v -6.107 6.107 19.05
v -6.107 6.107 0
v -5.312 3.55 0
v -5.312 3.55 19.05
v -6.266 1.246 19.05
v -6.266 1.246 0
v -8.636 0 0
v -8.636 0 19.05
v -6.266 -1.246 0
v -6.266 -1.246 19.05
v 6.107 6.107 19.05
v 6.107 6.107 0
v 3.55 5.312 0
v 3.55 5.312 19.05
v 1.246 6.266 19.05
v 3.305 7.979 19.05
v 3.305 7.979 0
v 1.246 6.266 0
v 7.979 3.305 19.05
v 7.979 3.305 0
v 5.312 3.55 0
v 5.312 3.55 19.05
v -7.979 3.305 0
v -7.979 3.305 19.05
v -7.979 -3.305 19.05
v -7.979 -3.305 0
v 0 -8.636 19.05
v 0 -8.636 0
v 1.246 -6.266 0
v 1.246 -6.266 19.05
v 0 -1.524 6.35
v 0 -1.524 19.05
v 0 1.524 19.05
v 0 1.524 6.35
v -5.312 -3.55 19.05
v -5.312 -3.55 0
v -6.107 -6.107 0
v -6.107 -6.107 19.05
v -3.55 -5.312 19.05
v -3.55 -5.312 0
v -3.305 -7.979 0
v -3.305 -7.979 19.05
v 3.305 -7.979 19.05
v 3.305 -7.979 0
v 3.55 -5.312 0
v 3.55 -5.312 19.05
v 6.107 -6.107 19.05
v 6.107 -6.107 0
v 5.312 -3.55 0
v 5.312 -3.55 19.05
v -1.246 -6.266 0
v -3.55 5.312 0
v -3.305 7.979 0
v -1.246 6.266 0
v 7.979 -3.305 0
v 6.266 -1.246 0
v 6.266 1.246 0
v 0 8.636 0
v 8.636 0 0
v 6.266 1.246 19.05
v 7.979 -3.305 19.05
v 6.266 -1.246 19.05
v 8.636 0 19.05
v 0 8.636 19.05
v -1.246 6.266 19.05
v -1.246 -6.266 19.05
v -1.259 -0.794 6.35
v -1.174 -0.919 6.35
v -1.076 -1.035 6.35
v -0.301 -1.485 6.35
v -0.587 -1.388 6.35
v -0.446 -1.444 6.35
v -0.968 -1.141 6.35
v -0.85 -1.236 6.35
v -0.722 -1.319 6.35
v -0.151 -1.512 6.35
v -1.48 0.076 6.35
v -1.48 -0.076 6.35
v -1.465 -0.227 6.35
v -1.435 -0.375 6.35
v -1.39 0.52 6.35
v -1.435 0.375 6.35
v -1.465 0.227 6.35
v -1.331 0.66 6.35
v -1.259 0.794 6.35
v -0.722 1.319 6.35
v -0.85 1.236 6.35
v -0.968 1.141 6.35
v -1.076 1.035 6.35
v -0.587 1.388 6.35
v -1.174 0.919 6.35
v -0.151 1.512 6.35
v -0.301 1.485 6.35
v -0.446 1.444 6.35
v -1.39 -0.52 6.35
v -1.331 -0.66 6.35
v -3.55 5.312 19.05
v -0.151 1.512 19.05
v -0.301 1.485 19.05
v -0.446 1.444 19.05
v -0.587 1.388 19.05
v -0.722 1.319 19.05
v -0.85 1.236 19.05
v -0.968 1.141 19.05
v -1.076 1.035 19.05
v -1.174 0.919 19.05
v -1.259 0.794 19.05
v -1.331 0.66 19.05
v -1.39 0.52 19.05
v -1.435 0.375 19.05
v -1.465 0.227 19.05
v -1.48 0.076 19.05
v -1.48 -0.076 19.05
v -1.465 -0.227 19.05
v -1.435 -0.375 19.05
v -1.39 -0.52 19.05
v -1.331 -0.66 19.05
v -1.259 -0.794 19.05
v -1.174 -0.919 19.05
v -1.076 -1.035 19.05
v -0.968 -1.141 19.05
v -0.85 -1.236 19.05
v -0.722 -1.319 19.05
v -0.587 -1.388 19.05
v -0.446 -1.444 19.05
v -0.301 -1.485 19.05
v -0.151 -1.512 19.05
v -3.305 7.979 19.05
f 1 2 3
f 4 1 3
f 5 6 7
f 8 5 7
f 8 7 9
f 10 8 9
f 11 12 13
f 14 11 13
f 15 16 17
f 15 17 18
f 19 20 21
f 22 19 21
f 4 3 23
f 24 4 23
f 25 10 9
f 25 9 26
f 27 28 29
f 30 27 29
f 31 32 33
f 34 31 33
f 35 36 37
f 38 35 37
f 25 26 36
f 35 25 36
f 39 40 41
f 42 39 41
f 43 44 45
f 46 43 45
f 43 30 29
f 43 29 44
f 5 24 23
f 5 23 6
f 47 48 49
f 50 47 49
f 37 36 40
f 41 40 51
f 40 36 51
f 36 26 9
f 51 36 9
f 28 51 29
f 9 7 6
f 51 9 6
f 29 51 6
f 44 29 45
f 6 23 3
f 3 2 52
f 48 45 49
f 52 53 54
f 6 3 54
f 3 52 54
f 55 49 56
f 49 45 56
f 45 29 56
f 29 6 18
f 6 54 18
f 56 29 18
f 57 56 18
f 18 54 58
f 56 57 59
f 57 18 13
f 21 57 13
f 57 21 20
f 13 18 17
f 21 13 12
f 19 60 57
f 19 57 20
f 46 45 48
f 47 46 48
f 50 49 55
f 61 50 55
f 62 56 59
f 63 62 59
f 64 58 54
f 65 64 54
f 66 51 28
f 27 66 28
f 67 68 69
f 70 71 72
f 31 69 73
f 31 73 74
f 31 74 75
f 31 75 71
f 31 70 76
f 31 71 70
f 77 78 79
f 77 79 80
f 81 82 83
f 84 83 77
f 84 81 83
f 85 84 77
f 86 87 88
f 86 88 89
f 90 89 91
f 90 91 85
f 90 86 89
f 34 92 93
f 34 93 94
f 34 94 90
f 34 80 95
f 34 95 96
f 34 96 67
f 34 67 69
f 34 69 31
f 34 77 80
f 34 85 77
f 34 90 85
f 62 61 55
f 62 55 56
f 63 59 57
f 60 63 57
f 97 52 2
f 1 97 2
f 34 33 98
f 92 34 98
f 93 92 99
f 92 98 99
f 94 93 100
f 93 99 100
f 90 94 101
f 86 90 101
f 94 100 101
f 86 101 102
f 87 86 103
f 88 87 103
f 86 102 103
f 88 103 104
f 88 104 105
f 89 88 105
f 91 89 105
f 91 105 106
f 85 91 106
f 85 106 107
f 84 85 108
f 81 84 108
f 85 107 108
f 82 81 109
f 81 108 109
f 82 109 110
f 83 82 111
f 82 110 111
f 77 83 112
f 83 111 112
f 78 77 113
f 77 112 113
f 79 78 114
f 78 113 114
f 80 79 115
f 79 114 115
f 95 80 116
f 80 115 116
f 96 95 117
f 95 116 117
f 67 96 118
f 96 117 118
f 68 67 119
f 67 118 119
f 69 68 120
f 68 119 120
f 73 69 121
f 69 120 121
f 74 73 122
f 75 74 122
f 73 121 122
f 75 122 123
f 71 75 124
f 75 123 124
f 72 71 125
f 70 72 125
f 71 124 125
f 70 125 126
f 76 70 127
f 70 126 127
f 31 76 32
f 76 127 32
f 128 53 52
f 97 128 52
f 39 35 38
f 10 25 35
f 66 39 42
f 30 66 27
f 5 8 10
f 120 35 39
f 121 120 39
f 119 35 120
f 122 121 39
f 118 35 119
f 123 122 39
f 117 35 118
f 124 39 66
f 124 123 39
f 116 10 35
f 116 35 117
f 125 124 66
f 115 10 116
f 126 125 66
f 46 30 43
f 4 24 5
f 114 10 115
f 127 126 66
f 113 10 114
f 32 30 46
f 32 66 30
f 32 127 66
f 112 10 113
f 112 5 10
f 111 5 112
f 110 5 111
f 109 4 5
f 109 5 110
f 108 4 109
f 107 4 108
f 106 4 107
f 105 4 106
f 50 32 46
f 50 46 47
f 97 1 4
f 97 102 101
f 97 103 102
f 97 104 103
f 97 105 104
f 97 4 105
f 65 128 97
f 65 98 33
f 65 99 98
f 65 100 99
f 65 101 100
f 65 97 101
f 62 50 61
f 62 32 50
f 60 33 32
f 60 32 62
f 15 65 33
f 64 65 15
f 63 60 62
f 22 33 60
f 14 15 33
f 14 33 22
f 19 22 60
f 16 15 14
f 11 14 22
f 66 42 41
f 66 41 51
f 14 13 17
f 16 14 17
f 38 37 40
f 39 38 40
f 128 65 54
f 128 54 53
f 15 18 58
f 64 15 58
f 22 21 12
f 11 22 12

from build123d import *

# Parameters (mm, degrees)
F1_DEPTH = 19.05
F3_DEPTH = 12.7


with BuildPart() as f1:
    # F0 (on Top) → F1 (new body)
    with BuildSketch(Plane.XY):
        with BuildLine():
            ThreePointArc((3.5542700278, 5.2620969746), (4.4901280605, 4.4901280605), (5.2620969746, 3.5542700278))
            Line((5.2620969746, 3.5542700278), (5.31242539, 3.5496491612))
            Line((5.31242539, 3.5496491612), (6.1065741623, 6.1065741623))
            Line((6.1065741623, 6.1065741623), (3.5496491612, 5.31242539))
            Line((3.5496491612, 5.31242539), (3.5542700278, 5.2620969746))
        make_face()
        with BuildLine():
            Line((6.2664330105, -1.2464710252), (6.2217039467, -1.27))
            ThreePointArc((6.2217039467, -1.27), (5.8666350314, -2.4300397955), (5.2974346633, -3.5013834391))
            Line((5.2974346633, -3.5013834391), (5.31242539, -3.5496491612))
            Line((5.31242539, -3.5496491612), (7.9786236428, -3.3048541219))
            Line((7.9786236428, -3.3048541219), (6.2664330105, -1.2464710252))
        make_face()
        with BuildLine():
            Line((1.2464710252, -6.2664330105), (1.2076160152, -6.2341128928))
            ThreePointArc((1.2076160152, -6.2341128928), (0, -6.35), (-1.2076160152, -6.2341128928))
            Line((-1.2076160152, -6.2341128928), (-1.2464710252, -6.2664330105))
            Line((-1.2464710252, -6.2664330105), (0, -8.636))
            Line((0, -8.636), (1.2464710252, -6.2664330105))
        make_face()
        with BuildLine():
            Line((-1.2464710252, -6.2664330105), (-1.27, -6.2217039467))
            ThreePointArc((-1.27, -6.2217039467), (-2.4300397955, -5.8666350314), (-3.5013834391, -5.2974346633))
            Line((-3.5013834391, -5.2974346633), (-3.5496491612, -5.31242539))
            Line((-3.5496491612, -5.31242539), (-3.3048541219, -7.9786236428))
            Line((-3.3048541219, -7.9786236428), (-1.2464710252, -6.2664330105))
        make_face()
        with BuildLine():
            ThreePointArc((6.2341128928, -1.2076160152), (6.3209618283, -0.6065818703), (6.35, 0))
            ThreePointArc((6.35, 0), (6.3209618283, 0.6065818703), (6.2341128928, 1.2076160152))
            ThreePointArc((6.2341128928, 1.2076160152), (6.2279865306, 1.2388235448), (6.2217039467, 1.27))
            ThreePointArc((6.2217039467, 1.27), (5.8666350314, 2.4300397955), (5.2974346633, 3.5013834391))
            ThreePointArc((5.2974346633, 3.5013834391), (5.2798320381, 3.5278709797), (5.2620969746, 3.5542700278))
            ThreePointArc((5.2620969746, 3.5542700278), (4.4901280605, 4.4901280605), (3.5542700278, 5.2620969746))
            ThreePointArc((3.5542700278, 5.2620969746), (3.5278709797, 5.2798320381), (3.5013834391, 5.2974346633))
            ThreePointArc((3.5013834391, 5.2974346633), (2.4300397955, 5.8666350314), (1.27, 6.2217039467))
            ThreePointArc((1.27, 6.2217039467), (1.2388235448, 6.2279865306), (1.2076160152, 6.2341128928))
            ThreePointArc((1.2076160152, 6.2341128928), (0, 6.35), (-1.2076160152, 6.2341128928))
            ThreePointArc((-1.2076160152, 6.2341128928), (-1.2388235448, 6.2279865306), (-1.27, 6.2217039467))
            ThreePointArc((-1.27, 6.2217039467), (-2.4300397955, 5.8666350314), (-3.5013834391, 5.2974346633))
            ThreePointArc((-3.5013834391, 5.2974346633), (-3.5278709797, 5.2798320381), (-3.5542700278, 5.2620969746))
            ThreePointArc((-3.5542700278, 5.2620969746), (-4.4901280605, 4.4901280605), (-5.2620969746, 3.5542700278))
            ThreePointArc((-5.2620969746, 3.5542700278), (-5.2798320381, 3.5278709797), (-5.2974346633, 3.5013834391))
            ThreePointArc((-5.2974346633, 3.5013834391), (-5.8666350314, 2.4300397955), (-6.2217039467, 1.27))
            ThreePointArc((-6.2217039467, 1.27), (-6.2279865306, 1.2388235448), (-6.2341128928, 1.2076160152))
            ThreePointArc((-6.2341128928, 1.2076160152), (-6.35, 0), (-6.2341128928, -1.2076160152))
            ThreePointArc((-6.2341128928, -1.2076160152), (-6.2279865306, -1.2388235448), (-6.2217039467, -1.27))
            ThreePointArc((-6.2217039467, -1.27), (-5.8666350314, -2.4300397955), (-5.2974346633, -3.5013834391))
            ThreePointArc((-5.2974346633, -3.5013834391), (-5.2798320381, -3.5278709797), (-5.2620969746, -3.5542700278))
            ThreePointArc((-5.2620969746, -3.5542700278), (-4.4901280605, -4.4901280605), (-3.5542700278, -5.2620969746))
            ThreePointArc((-3.5542700278, -5.2620969746), (-3.5278709797, -5.2798320381), (-3.5013834391, -5.2974346633))
            ThreePointArc((-3.5013834391, -5.2974346633), (-2.4300397955, -5.8666350314), (-1.27, -6.2217039467))
            ThreePointArc((-1.27, -6.2217039467), (-1.2388235448, -6.2279865306), (-1.2076160152, -6.2341128928))
            ThreePointArc((-1.2076160152, -6.2341128928), (0, -6.35), (1.2076160152, -6.2341128928))
            ThreePointArc((1.2076160152, -6.2341128928), (1.2388235448, -6.2279865306), (1.27, -6.2217039467))
            ThreePointArc((1.27, -6.2217039467), (2.4300397955, -5.8666350314), (3.5013834391, -5.2974346633))
            ThreePointArc((3.5013834391, -5.2974346633), (3.5278709797, -5.2798320381), (3.5542700278, -5.2620969746))
            ThreePointArc((3.5542700278, -5.2620969746), (4.4901280605, -4.4901280605), (5.2620969746, -3.5542700278))
            ThreePointArc((5.2620969746, -3.5542700278), (5.2798320381, -3.5278709797), (5.2974346633, -3.5013834391))
            ThreePointArc((5.2974346633, -3.5013834391), (5.8666350314, -2.4300397955), (6.2217039467, -1.27))
            ThreePointArc((6.2217039467, -1.27), (6.2279865306, -1.2388235448), (6.2341128928, -1.2076160152))
        make_face()
        with BuildLine():
            ThreePointArc((1.27, 6.2217039467), (2.4300397955, 5.8666350314), (3.5013834391, 5.2974346633))
            Line((3.5013834391, 5.2974346633), (3.5496491612, 5.31242539))
            Line((3.5496491612, 5.31242539), (3.3048541219, 7.9786236428))
            Line((3.3048541219, 7.9786236428), (1.2464710252, 6.2664330105))
            Line((1.2464710252, 6.2664330105), (1.27, 6.2217039467))
        make_face()
        with BuildLine():
            ThreePointArc((5.2974346633, 3.5013834391), (5.8666350314, 2.4300397955), (6.2217039467, 1.27))
            Line((6.2217039467, 1.27), (6.2664330105, 1.2464710252))
            Line((6.2664330105, 1.2464710252), (7.9786236428, 3.3048541219))
            Line((7.9786236428, 3.3048541219), (5.31242539, 3.5496491612))
            Line((5.31242539, 3.5496491612), (5.2974346633, 3.5013834391))
        make_face()
        with BuildLine():
            ThreePointArc((-6.2217039467, 1.27), (-5.8666350314, 2.4300397955), (-5.2974346633, 3.5013834391))
            Line((-5.2974346633, 3.5013834391), (-5.31242539, 3.5496491612))
            Line((-5.31242539, 3.5496491612), (-7.9786236428, 3.3048541219))
            Line((-7.9786236428, 3.3048541219), (-6.2664330105, 1.2464710252))
            Line((-6.2664330105, 1.2464710252), (-6.2217039467, 1.27))
        make_face()
        with BuildLine():
            Line((5.31242539, -3.5496491612), (5.2620969746, -3.5542700278))
            ThreePointArc((5.2620969746, -3.5542700278), (4.4901280605, -4.4901280605), (3.5542700278, -5.2620969746))
            Line((3.5542700278, -5.2620969746), (3.5496491612, -5.31242539))
            Line((3.5496491612, -5.31242539), (6.1065741623, -6.1065741623))
            Line((6.1065741623, -6.1065741623), (5.31242539, -3.5496491612))
        make_face()
        with BuildLine():
            ThreePointArc((-1.2076160152, 6.2341128928), (0, 6.35), (1.2076160152, 6.2341128928))
            Line((1.2076160152, 6.2341128928), (1.2464710252, 6.2664330105))
            Line((1.2464710252, 6.2664330105), (0, 8.636))
            Line((0, 8.636), (-1.2464710252, 6.2664330105))
            Line((-1.2464710252, 6.2664330105), (-1.2076160152, 6.2341128928))
        make_face()
        with BuildLine():
            ThreePointArc((-5.2620969746, 3.5542700278), (-4.4901280605, 4.4901280605), (-3.5542700278, 5.2620969746))
            Line((-3.5542700278, 5.2620969746), (-3.5496491612, 5.31242539))
            Line((-3.5496491612, 5.31242539), (-6.1065741623, 6.1065741623))
            Line((-6.1065741623, 6.1065741623), (-5.31242539, 3.5496491612))
            Line((-5.31242539, 3.5496491612), (-5.2620969746, 3.5542700278))
        make_face()
        with BuildLine():
            ThreePointArc((-6.2341128928, -1.2076160152), (-6.35, 0), (-6.2341128928, 1.2076160152))
            Line((-6.2341128928, 1.2076160152), (-6.2664330105, 1.2464710252))
            Line((-6.2664330105, 1.2464710252), (-8.636, 0))
            Line((-8.636, 0), (-6.2664330105, -1.2464710252))
            Line((-6.2664330105, -1.2464710252), (-6.2341128928, -1.2076160152))
        make_face()
        with BuildLine():
            Line((-5.31242539, -3.5496491612), (-5.2974346633, -3.5013834391))
            ThreePointArc((-5.2974346633, -3.5013834391), (-5.8666350314, -2.4300397955), (-6.2217039467, -1.27))
            Line((-6.2217039467, -1.27), (-6.2664330105, -1.2464710252))
            Line((-6.2664330105, -1.2464710252), (-7.9786236428, -3.3048541219))
            Line((-7.9786236428, -3.3048541219), (-5.31242539, -3.5496491612))
        make_face()
        with BuildLine():
            Line((3.5496491612, -5.31242539), (3.5013834391, -5.2974346633))
            ThreePointArc((3.5013834391, -5.2974346633), (2.4300397955, -5.8666350314), (1.27, -6.2217039467))
            Line((1.27, -6.2217039467), (1.2464710252, -6.2664330105))
            Line((1.2464710252, -6.2664330105), (3.3048541219, -7.9786236428))
            Line((3.3048541219, -7.9786236428), (3.5496491612, -5.31242539))
        make_face()
        with BuildLine():
            ThreePointArc((-3.5013834391, 5.2974346633), (-2.4300397955, 5.8666350314), (-1.27, 6.2217039467))
            Line((-1.27, 6.2217039467), (-1.2464710252, 6.2664330105))
            Line((-1.2464710252, 6.2664330105), (-3.3048541219, 7.9786236428))
            Line((-3.3048541219, 7.9786236428), (-3.5496491612, 5.31242539))
            Line((-3.5496491612, 5.31242539), (-3.5013834391, 5.2974346633))
        make_face()
        with BuildLine():
            Line((-3.5496491612, -5.31242539), (-3.5542700278, -5.2620969746))
            ThreePointArc((-3.5542700278, -5.2620969746), (-4.4901280605, -4.4901280605), (-5.2620969746, -3.5542700278))
            Line((-5.2620969746, -3.5542700278), (-5.31242539, -3.5496491612))
            Line((-5.31242539, -3.5496491612), (-6.1065741623, -6.1065741623))
            Line((-6.1065741623, -6.1065741623), (-3.5496491612, -5.31242539))
        make_face()
        with BuildLine():
            ThreePointArc((6.2341128928, 1.2076160152), (6.3209618283, 0.6065818703), (6.35, 0))
            ThreePointArc((6.35, 0), (6.3209618283, -0.6065818703), (6.2341128928, -1.2076160152))
            Line((6.2341128928, -1.2076160152), (6.2664330105, -1.2464710252))
            Line((6.2664330105, -1.2464710252), (8.636, 0))
            Line((8.636, 0), (6.2664330105, 1.2464710252))
            Line((6.2664330105, 1.2464710252), (6.2341128928, 1.2076160152))
        make_face()
        with BuildLine():
            ThreePointArc((-3.5542700278, 5.2620969746), (-3.5278709797, 5.2798320381), (-3.5013834391, 5.2974346633))
            Line((-3.5013834391, 5.2974346633), (-3.5496491612, 5.31242539))
            Line((-3.5496491612, 5.31242539), (-3.5542700278, 5.2620969746))
        make_face()
        with BuildLine():
            Line((-3.5496491612, -5.31242539), (-3.5013834391, -5.2974346633))
            ThreePointArc((-3.5013834391, -5.2974346633), (-3.5278709797, -5.2798320381), (-3.5542700278, -5.2620969746))
            Line((-3.5542700278, -5.2620969746), (-3.5496491612, -5.31242539))
        make_face()
        with BuildLine():
            ThreePointArc((3.5013834391, 5.2974346633), (3.5278709797, 5.2798320381), (3.5542700278, 5.2620969746))
            Line((3.5542700278, 5.2620969746), (3.5496491612, 5.31242539))
            Line((3.5496491612, 5.31242539), (3.5013834391, 5.2974346633))
        make_face()
        with BuildLine():
            Line((-1.2464710252, -6.2664330105), (-1.2076160152, -6.2341128928))
            ThreePointArc((-1.2076160152, -6.2341128928), (-1.2388235448, -6.2279865306), (-1.27, -6.2217039467))
            Line((-1.27, -6.2217039467), (-1.2464710252, -6.2664330105))
        make_face()
        with BuildLine():
            Line((5.31242539, -3.5496491612), (5.2974346633, -3.5013834391))
            ThreePointArc((5.2974346633, -3.5013834391), (5.2798320381, -3.5278709797), (5.2620969746, -3.5542700278))
            Line((5.2620969746, -3.5542700278), (5.31242539, -3.5496491612))
        make_face()
        with BuildLine():
            ThreePointArc((1.2076160152, 6.2341128928), (1.2388235448, 6.2279865306), (1.27, 6.2217039467))
            Line((1.27, 6.2217039467), (1.2464710252, 6.2664330105))
            Line((1.2464710252, 6.2664330105), (1.2076160152, 6.2341128928))
        make_face()
        with BuildLine():
            ThreePointArc((-5.2974346633, 3.5013834391), (-5.2798320381, 3.5278709797), (-5.2620969746, 3.5542700278))
            Line((-5.2620969746, 3.5542700278), (-5.31242539, 3.5496491612))
            Line((-5.31242539, 3.5496491612), (-5.2974346633, 3.5013834391))
        make_face()
        with BuildLine():
            ThreePointArc((6.2217039467, 1.27), (6.2279865306, 1.2388235448), (6.2341128928, 1.2076160152))
            Line((6.2341128928, 1.2076160152), (6.2664330105, 1.2464710252))
            Line((6.2664330105, 1.2464710252), (6.2217039467, 1.27))
        make_face()
        with BuildLine():
            Line((-6.2664330105, -1.2464710252), (-6.2217039467, -1.27))
            ThreePointArc((-6.2217039467, -1.27), (-6.2279865306, -1.2388235448), (-6.2341128928, -1.2076160152))
            Line((-6.2341128928, -1.2076160152), (-6.2664330105, -1.2464710252))
        make_face()
        with BuildLine():
            ThreePointArc((5.2620969746, 3.5542700278), (5.2798320381, 3.5278709797), (5.2974346633, 3.5013834391))
            Line((5.2974346633, 3.5013834391), (5.31242539, 3.5496491612))
            Line((5.31242539, 3.5496491612), (5.2620969746, 3.5542700278))
        make_face()
        with BuildLine():
            ThreePointArc((-1.27, 6.2217039467), (-1.2388235448, 6.2279865306), (-1.2076160152, 6.2341128928))
            Line((-1.2076160152, 6.2341128928), (-1.2464710252, 6.2664330105))
            Line((-1.2464710252, 6.2664330105), (-1.27, 6.2217039467))
        make_face()
        with BuildLine():
            Line((1.2464710252, -6.2664330105), (1.27, -6.2217039467))
            ThreePointArc((1.27, -6.2217039467), (1.2388235448, -6.2279865306), (1.2076160152, -6.2341128928))
            Line((1.2076160152, -6.2341128928), (1.2464710252, -6.2664330105))
        make_face()
        with BuildLine():
            ThreePointArc((-6.2341128928, 1.2076160152), (-6.2279865306, 1.2388235448), (-6.2217039467, 1.27))
            Line((-6.2217039467, 1.27), (-6.2664330105, 1.2464710252))
            Line((-6.2664330105, 1.2464710252), (-6.2341128928, 1.2076160152))
        make_face()
        with BuildLine():
            Line((6.2664330105, -1.2464710252), (6.2341128928, -1.2076160152))
            ThreePointArc((6.2341128928, -1.2076160152), (6.2279865306, -1.2388235448), (6.2217039467, -1.27))
            Line((6.2217039467, -1.27), (6.2664330105, -1.2464710252))
        make_face()
        with BuildLine():
            Line((3.5496491612, -5.31242539), (3.5542700278, -5.2620969746))
            ThreePointArc((3.5542700278, -5.2620969746), (3.5278709797, -5.2798320381), (3.5013834391, -5.2974346633))
            Line((3.5013834391, -5.2974346633), (3.5496491612, -5.31242539))
        make_face()
        with BuildLine():
            Line((-5.31242539, -3.5496491612), (-5.2620969746, -3.5542700278))
            ThreePointArc((-5.2620969746, -3.5542700278), (-5.2798320381, -3.5278709797), (-5.2974346633, -3.5013834391))
            Line((-5.2974346633, -3.5013834391), (-5.31242539, -3.5496491612))
        make_face()
    extrude(amount=F1_DEPTH)

    # F2 (on face) → F3 (cut)
    with BuildSketch(Plane.XY.offset(19.05)):
        with BuildLine():
            Line((0, -1.524), (0, 1.524))
            ThreePointArc((0, 1.524), (-1.4818060502, 0), (0, -1.524))
        make_face()
    extrude(amount=-F3_DEPTH, mode=Mode.SUBTRACT)


solid = f1.part
